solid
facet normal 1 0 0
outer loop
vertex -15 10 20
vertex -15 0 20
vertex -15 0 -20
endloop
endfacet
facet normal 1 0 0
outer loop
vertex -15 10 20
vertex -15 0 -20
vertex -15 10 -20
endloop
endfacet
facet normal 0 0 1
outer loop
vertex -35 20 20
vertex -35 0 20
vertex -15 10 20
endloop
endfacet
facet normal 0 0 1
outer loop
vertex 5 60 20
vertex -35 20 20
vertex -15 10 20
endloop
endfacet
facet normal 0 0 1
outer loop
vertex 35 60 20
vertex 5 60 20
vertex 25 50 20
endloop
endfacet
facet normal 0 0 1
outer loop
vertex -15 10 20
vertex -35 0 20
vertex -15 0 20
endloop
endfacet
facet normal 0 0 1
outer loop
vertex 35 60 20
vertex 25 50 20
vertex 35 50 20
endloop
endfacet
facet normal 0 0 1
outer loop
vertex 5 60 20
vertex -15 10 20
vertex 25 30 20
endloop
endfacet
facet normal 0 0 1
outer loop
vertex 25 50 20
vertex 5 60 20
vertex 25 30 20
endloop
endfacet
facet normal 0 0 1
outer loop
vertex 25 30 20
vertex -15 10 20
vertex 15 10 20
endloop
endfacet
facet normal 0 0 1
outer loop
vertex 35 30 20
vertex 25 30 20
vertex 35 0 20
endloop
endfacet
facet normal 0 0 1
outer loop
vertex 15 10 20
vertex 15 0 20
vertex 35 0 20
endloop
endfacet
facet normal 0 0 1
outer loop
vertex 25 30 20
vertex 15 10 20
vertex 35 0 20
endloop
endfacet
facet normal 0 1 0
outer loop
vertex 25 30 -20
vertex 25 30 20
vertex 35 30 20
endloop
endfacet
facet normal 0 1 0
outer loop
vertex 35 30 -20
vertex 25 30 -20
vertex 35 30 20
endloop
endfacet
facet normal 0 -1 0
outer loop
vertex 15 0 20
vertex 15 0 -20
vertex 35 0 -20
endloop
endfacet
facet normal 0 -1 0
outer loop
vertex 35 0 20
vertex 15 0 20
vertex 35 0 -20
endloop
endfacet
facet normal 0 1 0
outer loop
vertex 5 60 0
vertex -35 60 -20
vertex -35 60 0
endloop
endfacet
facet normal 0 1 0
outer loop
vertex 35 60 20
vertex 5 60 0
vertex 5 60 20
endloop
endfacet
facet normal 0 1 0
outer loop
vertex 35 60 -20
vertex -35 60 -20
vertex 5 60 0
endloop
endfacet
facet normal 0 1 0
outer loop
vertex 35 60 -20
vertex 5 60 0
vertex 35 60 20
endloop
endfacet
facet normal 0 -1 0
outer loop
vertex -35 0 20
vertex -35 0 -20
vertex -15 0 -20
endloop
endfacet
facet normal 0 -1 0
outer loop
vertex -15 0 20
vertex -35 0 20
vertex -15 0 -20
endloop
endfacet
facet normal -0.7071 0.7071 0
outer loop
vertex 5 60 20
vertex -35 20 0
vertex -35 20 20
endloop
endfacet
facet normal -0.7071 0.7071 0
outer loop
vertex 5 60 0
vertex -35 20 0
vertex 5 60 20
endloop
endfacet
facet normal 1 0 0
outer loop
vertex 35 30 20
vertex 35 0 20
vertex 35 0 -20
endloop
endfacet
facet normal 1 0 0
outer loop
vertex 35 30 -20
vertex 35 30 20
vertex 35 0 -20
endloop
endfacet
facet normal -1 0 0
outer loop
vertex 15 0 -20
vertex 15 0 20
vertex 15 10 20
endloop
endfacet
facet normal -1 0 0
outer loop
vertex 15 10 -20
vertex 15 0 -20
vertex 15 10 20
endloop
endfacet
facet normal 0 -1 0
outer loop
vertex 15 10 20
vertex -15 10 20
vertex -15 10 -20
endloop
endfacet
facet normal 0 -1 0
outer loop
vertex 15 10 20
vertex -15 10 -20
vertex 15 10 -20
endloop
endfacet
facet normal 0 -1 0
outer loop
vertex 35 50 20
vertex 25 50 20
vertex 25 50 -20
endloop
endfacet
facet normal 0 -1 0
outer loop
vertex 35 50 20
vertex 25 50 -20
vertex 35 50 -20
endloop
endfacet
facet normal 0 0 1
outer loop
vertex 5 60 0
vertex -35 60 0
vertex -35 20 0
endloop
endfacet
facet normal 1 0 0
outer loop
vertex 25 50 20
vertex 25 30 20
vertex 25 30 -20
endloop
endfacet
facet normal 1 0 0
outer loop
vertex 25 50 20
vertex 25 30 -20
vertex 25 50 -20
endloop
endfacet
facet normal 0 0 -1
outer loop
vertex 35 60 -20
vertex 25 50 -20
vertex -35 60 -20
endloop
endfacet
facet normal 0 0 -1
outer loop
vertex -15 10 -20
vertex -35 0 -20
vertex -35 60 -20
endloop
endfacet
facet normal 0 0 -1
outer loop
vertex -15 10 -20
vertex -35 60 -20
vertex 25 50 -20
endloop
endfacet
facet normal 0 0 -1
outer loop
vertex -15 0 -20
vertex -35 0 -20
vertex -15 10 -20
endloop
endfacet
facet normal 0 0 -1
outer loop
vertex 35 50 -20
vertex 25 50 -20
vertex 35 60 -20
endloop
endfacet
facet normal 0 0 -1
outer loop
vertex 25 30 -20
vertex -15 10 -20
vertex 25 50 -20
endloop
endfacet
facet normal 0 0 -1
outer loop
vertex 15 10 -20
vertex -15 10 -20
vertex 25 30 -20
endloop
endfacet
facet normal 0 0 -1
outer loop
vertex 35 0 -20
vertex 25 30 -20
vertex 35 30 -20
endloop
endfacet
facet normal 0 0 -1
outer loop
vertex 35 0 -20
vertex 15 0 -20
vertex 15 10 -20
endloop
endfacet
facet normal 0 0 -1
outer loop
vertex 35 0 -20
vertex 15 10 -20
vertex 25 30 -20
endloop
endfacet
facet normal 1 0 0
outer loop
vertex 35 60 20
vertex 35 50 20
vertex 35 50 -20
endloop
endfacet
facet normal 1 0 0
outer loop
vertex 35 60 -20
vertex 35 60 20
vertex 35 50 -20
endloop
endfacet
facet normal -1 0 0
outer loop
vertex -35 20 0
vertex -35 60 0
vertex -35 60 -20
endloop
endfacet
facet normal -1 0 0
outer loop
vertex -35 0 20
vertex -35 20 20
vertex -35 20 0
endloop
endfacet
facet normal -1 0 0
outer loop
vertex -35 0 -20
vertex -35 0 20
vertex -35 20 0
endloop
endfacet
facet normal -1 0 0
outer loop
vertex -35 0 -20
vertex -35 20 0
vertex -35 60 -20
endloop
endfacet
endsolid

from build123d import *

# Parameters (mm, degrees)
SKETCH1_W               = 70
SKETCH1_H               = 40
BOSS_EXTRUDE1_DEPTH     = 60
SKETCH2_W               = 30
SKETCH2_H               = 10
CUT_EXTRUDE1_DEPTH      = 81.156097709
SKETCH3_W               = 10
SKETCH3_H               = 20
CUT_EXTRUDE2_DEPTH      = 81.156097709
CUT_EXTRUDE3_DEPTH      = 81.156097709
CUT_EXTRUDE3_DEPTH_BACK = 20


with BuildPart() as part:
    # Sketch1 → Boss-Extrude1 (new body)
    with BuildSketch(Plane(origin=(0, 0, 0), x_dir=(1, 0, 0), z_dir=(0, 1, 0))):
        Rectangle(SKETCH1_W, SKETCH1_H)
    extrude(amount=BOSS_EXTRUDE1_DEPTH)

    # Sketch2 → Cut-Extrude1 (cut, through all)
    with BuildSketch(Plane.XY.offset(20)):
        with Locations((0, 5)):
            Rectangle(SKETCH2_W, SKETCH2_H)
    extrude(amount=-CUT_EXTRUDE1_DEPTH, mode=Mode.SUBTRACT)

    # Sketch3 → Cut-Extrude2 (cut, through all)
    with BuildSketch(Plane.XY.offset(20)):
        with Locations((30, 40)):
            Rectangle(SKETCH3_W, SKETCH3_H)
    extrude(amount=-CUT_EXTRUDE2_DEPTH, mode=Mode.SUBTRACT)

    # Sketch4 → Cut-Extrude3 (cut, two sides: drawn at the far end of the back side and taken through both)
    with BuildSketch(Plane.XY.offset(20).offset(-CUT_EXTRUDE3_DEPTH_BACK)):
        Polygon((-156.088610322, -101.088610322), (-35, 20), (5, 60), (126.088610322, 181.088610322), (-116.088610322, 423.265830965), (-398.265830965, 141.088610322), align=None)
    extrude(amount=CUT_EXTRUDE3_DEPTH + CUT_EXTRUDE3_DEPTH_BACK, mode=Mode.SUBTRACT)


solid = part.part
